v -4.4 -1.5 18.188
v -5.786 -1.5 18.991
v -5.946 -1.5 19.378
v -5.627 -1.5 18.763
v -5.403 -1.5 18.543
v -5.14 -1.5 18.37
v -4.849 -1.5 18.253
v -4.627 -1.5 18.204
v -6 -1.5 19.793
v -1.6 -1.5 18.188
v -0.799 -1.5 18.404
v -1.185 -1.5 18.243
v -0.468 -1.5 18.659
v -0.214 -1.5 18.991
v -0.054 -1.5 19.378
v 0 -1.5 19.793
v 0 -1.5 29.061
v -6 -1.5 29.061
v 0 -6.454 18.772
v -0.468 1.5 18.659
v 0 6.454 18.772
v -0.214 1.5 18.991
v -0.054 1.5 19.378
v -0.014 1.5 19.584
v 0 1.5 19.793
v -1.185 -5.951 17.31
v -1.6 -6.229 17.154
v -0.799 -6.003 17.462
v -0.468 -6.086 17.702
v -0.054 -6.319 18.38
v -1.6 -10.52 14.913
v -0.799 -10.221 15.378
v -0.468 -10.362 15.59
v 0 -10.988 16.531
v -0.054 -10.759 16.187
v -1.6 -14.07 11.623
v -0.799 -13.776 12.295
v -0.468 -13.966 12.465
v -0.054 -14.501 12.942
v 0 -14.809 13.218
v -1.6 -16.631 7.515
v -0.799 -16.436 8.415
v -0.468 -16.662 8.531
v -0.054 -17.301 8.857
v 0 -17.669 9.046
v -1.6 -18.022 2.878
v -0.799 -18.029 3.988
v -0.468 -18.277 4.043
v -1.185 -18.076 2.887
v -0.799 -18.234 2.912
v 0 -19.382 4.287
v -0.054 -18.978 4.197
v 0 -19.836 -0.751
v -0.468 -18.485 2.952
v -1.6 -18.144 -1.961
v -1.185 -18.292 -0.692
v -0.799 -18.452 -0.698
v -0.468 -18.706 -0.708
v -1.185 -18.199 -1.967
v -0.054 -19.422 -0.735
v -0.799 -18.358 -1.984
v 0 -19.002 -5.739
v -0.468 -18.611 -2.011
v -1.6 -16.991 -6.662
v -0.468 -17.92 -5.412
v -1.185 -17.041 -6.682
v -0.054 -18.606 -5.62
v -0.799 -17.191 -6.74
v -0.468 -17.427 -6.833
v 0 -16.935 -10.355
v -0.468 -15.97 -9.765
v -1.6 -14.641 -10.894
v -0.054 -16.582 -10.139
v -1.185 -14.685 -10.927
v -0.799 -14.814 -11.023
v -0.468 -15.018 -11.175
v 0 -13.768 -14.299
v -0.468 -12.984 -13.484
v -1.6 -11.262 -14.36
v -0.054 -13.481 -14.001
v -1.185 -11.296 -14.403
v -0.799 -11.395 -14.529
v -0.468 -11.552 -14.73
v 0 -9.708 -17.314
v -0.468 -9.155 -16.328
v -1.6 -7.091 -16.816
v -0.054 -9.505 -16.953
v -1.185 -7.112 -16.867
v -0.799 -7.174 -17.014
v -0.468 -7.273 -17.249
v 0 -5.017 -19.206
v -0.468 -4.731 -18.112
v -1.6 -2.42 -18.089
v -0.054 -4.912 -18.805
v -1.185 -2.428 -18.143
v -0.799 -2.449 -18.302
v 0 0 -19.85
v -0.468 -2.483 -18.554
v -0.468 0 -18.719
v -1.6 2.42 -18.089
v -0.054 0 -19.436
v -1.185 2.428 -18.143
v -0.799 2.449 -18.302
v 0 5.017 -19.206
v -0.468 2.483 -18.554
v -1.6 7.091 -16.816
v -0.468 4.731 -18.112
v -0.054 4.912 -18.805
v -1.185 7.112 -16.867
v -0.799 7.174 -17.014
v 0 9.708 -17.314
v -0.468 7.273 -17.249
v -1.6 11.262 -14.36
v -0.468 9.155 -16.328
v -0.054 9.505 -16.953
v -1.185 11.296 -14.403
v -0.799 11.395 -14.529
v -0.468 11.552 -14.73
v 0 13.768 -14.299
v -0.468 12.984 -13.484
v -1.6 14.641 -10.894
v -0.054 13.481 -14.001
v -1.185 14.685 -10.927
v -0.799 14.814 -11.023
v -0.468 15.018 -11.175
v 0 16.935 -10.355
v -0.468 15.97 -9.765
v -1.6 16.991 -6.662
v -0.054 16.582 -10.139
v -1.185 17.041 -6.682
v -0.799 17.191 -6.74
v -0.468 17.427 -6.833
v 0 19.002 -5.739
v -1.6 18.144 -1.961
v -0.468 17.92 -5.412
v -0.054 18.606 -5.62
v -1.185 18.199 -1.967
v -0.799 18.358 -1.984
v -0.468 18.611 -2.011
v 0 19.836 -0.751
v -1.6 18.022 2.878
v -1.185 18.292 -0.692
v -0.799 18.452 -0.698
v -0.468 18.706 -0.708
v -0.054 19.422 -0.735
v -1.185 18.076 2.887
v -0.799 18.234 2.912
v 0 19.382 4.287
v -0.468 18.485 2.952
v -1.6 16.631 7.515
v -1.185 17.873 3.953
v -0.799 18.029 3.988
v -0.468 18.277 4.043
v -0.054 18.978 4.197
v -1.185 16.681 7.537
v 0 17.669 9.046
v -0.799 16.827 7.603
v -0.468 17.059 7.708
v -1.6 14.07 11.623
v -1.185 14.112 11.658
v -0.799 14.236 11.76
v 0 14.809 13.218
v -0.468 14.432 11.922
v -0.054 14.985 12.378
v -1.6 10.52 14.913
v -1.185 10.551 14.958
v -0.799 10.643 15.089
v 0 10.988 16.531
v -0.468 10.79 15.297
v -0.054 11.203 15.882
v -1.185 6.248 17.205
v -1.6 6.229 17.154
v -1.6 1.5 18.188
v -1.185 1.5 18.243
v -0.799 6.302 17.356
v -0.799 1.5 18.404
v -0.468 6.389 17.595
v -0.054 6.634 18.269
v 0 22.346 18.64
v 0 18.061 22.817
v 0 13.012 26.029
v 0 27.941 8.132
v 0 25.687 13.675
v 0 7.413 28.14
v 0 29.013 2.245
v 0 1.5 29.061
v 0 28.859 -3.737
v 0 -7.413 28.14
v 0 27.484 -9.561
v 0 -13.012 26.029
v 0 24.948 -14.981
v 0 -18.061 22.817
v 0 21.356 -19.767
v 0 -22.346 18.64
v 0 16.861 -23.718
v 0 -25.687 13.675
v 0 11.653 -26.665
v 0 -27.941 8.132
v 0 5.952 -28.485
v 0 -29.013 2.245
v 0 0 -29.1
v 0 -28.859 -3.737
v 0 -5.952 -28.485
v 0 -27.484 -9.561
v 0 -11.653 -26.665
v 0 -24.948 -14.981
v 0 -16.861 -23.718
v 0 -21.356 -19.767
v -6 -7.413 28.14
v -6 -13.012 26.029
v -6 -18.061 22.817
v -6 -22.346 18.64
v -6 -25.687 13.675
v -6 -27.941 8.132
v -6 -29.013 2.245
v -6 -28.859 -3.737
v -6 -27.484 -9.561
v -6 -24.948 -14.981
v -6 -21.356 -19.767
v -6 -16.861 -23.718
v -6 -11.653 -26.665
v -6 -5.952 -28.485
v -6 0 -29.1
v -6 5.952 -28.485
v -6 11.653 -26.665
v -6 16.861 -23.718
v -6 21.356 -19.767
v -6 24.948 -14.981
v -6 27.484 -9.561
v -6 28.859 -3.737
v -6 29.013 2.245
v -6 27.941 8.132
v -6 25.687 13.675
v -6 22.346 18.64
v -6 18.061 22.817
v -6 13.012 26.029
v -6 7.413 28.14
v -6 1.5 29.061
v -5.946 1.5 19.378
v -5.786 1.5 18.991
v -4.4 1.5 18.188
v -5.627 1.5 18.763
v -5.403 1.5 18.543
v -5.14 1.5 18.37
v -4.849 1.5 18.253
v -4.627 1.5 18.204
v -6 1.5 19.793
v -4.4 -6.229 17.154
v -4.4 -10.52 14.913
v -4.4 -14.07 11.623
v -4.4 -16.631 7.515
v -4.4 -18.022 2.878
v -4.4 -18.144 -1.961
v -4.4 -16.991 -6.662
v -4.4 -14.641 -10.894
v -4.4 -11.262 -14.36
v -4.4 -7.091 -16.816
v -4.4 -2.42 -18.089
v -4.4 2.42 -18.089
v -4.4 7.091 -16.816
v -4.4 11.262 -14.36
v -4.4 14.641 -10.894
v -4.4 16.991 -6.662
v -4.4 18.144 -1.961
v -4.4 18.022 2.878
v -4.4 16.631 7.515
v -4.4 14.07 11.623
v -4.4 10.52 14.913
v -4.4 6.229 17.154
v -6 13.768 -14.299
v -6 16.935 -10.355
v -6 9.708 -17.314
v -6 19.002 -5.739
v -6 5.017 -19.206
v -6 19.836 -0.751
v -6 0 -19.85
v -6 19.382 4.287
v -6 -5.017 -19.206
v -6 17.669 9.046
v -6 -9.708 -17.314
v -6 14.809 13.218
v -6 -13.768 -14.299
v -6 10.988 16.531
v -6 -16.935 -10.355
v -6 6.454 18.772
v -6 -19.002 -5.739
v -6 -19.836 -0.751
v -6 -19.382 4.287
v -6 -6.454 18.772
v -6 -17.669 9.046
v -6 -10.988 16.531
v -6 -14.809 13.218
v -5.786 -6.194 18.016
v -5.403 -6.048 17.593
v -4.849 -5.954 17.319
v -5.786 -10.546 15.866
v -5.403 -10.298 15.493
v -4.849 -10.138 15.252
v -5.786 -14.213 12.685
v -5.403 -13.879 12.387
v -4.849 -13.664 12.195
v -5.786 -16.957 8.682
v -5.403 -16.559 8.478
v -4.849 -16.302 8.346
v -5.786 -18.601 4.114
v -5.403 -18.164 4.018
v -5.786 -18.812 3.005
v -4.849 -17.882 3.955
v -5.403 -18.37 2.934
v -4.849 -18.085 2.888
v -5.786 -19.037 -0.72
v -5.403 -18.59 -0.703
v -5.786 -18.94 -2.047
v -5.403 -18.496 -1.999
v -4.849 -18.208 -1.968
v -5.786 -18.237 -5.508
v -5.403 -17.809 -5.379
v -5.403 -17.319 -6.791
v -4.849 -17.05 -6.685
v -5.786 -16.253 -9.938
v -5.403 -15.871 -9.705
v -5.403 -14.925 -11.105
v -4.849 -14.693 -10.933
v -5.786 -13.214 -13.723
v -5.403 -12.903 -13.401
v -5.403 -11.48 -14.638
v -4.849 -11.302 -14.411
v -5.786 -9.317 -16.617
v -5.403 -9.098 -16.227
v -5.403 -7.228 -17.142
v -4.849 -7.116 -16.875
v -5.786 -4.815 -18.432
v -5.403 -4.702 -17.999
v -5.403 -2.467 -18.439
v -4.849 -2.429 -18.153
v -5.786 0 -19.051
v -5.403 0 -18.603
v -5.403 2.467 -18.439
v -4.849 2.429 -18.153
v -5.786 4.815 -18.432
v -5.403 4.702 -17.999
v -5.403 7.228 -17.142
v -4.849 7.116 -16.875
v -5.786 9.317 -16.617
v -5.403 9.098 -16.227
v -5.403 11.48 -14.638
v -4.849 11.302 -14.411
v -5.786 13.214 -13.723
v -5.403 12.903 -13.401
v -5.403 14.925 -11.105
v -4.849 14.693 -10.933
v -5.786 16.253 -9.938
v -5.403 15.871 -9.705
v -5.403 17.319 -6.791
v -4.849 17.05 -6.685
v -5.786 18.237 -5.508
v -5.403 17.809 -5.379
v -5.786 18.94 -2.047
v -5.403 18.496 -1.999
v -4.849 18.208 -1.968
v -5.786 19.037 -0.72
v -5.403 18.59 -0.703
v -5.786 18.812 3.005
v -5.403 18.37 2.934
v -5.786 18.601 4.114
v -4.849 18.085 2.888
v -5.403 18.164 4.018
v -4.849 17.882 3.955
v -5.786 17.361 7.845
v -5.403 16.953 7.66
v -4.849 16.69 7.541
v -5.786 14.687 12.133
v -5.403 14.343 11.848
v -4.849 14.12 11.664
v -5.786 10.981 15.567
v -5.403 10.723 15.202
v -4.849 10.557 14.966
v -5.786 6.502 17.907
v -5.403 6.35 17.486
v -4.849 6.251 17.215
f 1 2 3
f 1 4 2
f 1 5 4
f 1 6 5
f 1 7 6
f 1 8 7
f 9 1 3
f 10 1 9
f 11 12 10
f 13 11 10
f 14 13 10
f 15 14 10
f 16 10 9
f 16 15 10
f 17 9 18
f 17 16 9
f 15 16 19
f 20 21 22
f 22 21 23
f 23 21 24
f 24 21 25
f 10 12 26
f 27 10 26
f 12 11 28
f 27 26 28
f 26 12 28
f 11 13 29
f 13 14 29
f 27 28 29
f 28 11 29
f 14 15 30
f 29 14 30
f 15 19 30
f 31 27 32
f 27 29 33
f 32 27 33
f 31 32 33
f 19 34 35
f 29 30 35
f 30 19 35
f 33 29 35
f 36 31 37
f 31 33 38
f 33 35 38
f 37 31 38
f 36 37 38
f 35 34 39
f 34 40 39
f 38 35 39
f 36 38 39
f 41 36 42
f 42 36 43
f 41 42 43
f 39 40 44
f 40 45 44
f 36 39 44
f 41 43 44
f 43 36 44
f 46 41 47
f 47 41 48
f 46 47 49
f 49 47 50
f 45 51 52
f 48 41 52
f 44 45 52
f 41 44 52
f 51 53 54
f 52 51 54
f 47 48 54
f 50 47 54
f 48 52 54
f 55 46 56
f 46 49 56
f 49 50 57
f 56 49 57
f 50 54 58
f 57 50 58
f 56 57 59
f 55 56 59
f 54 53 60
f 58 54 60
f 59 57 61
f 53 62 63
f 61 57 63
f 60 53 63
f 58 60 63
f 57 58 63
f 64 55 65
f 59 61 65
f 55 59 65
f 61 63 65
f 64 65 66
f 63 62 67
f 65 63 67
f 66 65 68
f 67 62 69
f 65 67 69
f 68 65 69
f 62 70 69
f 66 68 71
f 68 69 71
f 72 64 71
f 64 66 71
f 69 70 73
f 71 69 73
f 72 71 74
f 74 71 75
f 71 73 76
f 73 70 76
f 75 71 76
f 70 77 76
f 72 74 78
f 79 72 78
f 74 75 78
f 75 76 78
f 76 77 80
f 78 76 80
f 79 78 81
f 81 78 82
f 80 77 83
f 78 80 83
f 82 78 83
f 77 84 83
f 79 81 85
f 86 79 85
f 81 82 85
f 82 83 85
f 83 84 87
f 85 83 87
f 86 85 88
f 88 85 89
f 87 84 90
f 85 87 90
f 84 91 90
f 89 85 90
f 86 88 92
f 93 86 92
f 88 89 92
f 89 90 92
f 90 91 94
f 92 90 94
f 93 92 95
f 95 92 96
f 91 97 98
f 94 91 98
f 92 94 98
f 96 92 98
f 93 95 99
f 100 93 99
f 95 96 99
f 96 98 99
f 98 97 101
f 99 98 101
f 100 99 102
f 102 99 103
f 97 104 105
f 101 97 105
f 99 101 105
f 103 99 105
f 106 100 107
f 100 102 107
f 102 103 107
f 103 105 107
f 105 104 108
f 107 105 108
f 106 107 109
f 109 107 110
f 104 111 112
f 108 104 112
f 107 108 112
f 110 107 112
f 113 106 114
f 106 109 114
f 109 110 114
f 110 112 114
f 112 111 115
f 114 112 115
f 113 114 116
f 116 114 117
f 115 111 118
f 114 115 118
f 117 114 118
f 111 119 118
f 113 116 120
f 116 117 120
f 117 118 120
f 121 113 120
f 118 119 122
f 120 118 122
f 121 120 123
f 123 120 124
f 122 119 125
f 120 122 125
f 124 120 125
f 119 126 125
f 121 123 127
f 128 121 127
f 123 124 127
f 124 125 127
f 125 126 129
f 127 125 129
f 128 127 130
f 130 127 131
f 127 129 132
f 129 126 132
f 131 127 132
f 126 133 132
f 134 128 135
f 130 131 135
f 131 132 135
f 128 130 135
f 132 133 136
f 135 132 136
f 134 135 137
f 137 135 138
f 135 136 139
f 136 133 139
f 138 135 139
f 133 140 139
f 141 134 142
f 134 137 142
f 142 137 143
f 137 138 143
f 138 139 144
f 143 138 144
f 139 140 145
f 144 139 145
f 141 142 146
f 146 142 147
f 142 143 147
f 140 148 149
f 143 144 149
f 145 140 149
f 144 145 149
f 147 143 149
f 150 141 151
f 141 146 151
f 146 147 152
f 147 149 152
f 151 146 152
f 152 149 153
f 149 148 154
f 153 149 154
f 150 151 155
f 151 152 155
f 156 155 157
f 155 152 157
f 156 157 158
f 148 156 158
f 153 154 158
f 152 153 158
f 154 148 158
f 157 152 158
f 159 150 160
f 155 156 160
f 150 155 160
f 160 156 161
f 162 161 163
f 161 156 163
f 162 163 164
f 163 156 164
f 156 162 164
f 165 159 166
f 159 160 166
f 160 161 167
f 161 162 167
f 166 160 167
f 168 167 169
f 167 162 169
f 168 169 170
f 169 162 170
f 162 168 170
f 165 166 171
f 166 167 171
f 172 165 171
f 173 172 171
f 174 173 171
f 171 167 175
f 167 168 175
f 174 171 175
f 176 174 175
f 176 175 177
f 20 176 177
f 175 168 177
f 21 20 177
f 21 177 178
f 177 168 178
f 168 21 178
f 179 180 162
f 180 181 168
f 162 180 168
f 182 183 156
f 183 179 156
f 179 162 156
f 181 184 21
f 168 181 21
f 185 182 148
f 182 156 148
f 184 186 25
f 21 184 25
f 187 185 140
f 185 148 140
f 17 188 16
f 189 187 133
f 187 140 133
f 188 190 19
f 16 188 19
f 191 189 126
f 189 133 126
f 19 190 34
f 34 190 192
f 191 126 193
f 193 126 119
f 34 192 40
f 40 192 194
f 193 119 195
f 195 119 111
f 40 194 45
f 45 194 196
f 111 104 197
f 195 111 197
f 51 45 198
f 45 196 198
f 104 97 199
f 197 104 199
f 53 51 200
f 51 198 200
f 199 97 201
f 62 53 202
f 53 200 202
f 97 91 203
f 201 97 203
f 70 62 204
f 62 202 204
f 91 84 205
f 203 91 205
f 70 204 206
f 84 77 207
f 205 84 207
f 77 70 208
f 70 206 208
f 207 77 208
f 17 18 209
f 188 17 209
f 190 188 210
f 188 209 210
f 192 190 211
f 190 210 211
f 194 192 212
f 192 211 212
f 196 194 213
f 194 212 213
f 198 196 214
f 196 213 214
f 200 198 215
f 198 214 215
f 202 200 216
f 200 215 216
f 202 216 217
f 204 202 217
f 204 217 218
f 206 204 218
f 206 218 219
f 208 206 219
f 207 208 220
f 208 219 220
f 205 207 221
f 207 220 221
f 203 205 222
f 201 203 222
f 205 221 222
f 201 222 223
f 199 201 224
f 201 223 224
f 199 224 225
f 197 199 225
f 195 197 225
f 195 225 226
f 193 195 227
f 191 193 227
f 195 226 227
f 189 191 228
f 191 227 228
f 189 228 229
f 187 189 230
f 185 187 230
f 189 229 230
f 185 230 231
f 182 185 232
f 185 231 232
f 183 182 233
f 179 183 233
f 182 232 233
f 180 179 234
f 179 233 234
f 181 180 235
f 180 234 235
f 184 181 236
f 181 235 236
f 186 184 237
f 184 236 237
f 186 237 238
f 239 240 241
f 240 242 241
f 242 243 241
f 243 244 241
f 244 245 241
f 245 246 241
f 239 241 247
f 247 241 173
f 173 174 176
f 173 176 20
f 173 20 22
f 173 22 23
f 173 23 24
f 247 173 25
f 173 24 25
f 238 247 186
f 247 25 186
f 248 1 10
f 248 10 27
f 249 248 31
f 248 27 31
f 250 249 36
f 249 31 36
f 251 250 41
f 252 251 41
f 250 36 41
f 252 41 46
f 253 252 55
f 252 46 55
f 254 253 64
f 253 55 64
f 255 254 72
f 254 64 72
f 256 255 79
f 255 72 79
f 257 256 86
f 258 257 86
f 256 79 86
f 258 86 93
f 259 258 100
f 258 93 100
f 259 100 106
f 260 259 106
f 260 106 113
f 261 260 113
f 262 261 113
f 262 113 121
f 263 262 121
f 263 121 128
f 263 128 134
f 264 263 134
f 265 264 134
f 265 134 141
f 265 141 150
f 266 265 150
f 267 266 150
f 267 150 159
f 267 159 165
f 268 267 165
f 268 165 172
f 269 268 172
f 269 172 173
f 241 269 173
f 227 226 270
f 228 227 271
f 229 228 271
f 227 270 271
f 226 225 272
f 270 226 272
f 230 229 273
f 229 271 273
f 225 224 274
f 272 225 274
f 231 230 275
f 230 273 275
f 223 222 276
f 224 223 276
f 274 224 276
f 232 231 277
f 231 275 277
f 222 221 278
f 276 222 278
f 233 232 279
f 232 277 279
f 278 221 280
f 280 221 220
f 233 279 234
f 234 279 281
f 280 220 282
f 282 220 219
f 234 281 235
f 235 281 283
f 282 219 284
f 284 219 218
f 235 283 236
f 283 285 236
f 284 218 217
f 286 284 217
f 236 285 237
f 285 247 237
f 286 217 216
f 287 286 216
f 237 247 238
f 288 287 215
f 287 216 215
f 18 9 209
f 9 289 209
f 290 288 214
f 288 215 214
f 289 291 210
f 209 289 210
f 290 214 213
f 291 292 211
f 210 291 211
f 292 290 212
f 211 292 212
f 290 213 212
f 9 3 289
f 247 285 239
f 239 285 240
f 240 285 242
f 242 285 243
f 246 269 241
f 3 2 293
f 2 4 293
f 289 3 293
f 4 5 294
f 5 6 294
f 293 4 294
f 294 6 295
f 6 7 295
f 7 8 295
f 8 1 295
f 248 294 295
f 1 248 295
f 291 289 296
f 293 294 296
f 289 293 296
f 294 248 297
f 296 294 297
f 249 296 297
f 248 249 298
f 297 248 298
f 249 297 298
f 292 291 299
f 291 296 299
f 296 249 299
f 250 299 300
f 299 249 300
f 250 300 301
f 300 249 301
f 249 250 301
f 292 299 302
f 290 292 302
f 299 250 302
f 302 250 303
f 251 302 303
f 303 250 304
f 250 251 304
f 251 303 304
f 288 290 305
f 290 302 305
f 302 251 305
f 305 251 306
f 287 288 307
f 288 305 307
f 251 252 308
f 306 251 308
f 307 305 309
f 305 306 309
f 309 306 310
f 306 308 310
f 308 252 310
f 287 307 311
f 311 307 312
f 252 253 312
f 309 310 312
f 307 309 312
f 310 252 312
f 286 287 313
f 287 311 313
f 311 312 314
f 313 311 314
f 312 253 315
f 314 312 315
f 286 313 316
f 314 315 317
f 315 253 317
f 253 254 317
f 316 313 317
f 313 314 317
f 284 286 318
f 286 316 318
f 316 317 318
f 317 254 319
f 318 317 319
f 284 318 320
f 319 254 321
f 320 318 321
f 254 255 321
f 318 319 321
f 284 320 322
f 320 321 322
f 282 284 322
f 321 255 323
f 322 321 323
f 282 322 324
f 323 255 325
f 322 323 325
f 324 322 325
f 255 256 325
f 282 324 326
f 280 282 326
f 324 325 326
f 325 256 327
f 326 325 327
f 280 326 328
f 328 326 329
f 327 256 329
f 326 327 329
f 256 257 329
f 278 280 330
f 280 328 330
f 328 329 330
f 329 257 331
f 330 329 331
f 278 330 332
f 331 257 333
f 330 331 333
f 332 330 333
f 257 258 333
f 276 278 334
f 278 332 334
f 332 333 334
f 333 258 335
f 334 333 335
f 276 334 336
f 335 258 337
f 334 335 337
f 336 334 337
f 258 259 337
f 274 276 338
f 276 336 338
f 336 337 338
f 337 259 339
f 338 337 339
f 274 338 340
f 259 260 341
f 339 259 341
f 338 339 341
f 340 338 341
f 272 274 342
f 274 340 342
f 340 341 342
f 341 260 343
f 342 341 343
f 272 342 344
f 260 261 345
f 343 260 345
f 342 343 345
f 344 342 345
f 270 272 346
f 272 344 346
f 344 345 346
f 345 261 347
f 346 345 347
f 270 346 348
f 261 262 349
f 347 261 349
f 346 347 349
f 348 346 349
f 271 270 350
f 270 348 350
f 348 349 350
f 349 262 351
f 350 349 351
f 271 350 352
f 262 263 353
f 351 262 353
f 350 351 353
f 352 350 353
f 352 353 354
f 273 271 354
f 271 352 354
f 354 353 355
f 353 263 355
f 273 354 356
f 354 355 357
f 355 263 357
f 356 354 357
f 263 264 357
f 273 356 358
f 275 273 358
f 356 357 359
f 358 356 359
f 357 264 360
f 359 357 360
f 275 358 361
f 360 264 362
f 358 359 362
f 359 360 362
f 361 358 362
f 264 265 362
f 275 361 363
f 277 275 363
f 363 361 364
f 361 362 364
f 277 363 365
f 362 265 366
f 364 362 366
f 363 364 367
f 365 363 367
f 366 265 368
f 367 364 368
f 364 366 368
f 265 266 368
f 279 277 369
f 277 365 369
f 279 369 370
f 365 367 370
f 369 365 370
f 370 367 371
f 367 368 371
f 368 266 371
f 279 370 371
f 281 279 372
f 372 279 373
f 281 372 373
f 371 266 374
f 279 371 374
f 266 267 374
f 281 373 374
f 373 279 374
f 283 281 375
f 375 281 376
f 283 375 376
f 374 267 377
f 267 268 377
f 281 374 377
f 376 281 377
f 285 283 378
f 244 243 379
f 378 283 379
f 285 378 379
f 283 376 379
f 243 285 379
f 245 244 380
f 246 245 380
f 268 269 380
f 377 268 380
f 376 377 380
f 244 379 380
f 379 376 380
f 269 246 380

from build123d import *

# Parameters (mm, degrees)
SKETCH2_W = 3
SKETCH2_H = 29.682
GAP_DEPTH = 42.588700388


with BuildPart() as part:
    # Sketch1 → Base-Revolve (revolve)
    with BuildSketch(Plane.XY):
        with BuildLine():
            Line((0, 19.85), (0, 29.1))
            Line((0, 29.1), (-6, 29.1))
            Line((-6, 29.1), (-6, 19.85))
            ThreePointArc((-6, 19.85), (-5.53137085, 18.71862915), (-4.4, 18.25))
            Line((-4.4, 18.25), (-1.6, 18.25))
            ThreePointArc((-1.6, 18.25), (-0.46862915, 18.71862915), (0, 19.85))
        make_face()
    revolve(axis=Axis((-34.925, 0, 0), (1, 0, 0)))

    # Sketch2 → Gap (cut, through all)
    with BuildSketch(Plane(origin=(0, 0, 0), x_dir=(0, -1, 0), z_dir=(-1, 0, 0))):
        with Locations((0, 14.841)):
            Rectangle(SKETCH2_W, SKETCH2_H)
    extrude(amount=GAP_DEPTH, mode=Mode.SUBTRACT)


solid = part.part
